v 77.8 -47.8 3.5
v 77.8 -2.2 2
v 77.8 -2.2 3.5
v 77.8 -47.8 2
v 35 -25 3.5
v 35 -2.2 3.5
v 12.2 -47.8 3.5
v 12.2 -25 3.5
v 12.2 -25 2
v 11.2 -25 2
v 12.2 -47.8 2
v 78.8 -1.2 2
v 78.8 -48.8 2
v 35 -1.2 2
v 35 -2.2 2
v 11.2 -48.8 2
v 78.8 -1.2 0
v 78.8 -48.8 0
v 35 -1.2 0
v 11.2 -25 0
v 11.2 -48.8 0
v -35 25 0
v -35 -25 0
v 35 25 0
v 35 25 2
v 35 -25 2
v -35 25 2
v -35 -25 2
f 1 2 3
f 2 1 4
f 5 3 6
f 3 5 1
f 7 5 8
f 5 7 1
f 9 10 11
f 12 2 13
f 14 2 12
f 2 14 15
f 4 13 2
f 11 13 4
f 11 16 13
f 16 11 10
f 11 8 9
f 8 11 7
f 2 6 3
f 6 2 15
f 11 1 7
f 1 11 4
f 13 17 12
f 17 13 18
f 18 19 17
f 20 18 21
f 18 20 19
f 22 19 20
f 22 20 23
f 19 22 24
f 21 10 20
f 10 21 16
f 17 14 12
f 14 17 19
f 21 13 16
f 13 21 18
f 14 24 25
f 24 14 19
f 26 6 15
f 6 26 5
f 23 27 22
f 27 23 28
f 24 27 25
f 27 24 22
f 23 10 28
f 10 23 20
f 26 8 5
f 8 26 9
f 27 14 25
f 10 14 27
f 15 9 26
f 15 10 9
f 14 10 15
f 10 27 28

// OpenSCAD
// Two-part enclosure: box (left) + lid (right), printed together
// Units: mm

// ---- Box ----
box_x = 70;    // outer length (X)
box_y = 50;    // outer width (Y)
box_z = 30;    // outer height (Z)
box_w = 2;     // wall thickness
box_f = 2;     // floor thickness

// ---- Lid ----
lip_x   = 65.6;  // lip outer length (X)
lip_y   = 45.6;  // lip outer width (Y)
lip_w   = 1.5;   // lip thickness
lip_h   = 4;     // lip height
plate_t = 2;     // lid plate thickness
gap     = 10;    // gap between box and lid

// ---- Misc ----
eps = 0.5;       // cut overshoot
$fn = 64;

difference() {
    union() {
        // Box
        translate([-box_x/2, -box_y/2, 0])
            cube([box_x, box_y, box_z]);
        // Lid (upside down: lip on top, plate below)
        translate([box_x/2 + gap, -box_y/2, 0])
            union() {
                translate([-lip_x/2, -lip_y/2, plate_t])
                    cube([lip_x, lip_y, lip_w]);   // lip
                translate([-lip_x/2 - 1, -lip_y/2 - 1, 0])
                    cube([lip_x + 2, lip_y + 2, plate_t]); // plate
            }
    }
    // Box opening (through the top face)
    translate([-box_x/2, -box_y/2, box_f])
        cube([box_x, box_y, box_z - box_f + eps]);
}
